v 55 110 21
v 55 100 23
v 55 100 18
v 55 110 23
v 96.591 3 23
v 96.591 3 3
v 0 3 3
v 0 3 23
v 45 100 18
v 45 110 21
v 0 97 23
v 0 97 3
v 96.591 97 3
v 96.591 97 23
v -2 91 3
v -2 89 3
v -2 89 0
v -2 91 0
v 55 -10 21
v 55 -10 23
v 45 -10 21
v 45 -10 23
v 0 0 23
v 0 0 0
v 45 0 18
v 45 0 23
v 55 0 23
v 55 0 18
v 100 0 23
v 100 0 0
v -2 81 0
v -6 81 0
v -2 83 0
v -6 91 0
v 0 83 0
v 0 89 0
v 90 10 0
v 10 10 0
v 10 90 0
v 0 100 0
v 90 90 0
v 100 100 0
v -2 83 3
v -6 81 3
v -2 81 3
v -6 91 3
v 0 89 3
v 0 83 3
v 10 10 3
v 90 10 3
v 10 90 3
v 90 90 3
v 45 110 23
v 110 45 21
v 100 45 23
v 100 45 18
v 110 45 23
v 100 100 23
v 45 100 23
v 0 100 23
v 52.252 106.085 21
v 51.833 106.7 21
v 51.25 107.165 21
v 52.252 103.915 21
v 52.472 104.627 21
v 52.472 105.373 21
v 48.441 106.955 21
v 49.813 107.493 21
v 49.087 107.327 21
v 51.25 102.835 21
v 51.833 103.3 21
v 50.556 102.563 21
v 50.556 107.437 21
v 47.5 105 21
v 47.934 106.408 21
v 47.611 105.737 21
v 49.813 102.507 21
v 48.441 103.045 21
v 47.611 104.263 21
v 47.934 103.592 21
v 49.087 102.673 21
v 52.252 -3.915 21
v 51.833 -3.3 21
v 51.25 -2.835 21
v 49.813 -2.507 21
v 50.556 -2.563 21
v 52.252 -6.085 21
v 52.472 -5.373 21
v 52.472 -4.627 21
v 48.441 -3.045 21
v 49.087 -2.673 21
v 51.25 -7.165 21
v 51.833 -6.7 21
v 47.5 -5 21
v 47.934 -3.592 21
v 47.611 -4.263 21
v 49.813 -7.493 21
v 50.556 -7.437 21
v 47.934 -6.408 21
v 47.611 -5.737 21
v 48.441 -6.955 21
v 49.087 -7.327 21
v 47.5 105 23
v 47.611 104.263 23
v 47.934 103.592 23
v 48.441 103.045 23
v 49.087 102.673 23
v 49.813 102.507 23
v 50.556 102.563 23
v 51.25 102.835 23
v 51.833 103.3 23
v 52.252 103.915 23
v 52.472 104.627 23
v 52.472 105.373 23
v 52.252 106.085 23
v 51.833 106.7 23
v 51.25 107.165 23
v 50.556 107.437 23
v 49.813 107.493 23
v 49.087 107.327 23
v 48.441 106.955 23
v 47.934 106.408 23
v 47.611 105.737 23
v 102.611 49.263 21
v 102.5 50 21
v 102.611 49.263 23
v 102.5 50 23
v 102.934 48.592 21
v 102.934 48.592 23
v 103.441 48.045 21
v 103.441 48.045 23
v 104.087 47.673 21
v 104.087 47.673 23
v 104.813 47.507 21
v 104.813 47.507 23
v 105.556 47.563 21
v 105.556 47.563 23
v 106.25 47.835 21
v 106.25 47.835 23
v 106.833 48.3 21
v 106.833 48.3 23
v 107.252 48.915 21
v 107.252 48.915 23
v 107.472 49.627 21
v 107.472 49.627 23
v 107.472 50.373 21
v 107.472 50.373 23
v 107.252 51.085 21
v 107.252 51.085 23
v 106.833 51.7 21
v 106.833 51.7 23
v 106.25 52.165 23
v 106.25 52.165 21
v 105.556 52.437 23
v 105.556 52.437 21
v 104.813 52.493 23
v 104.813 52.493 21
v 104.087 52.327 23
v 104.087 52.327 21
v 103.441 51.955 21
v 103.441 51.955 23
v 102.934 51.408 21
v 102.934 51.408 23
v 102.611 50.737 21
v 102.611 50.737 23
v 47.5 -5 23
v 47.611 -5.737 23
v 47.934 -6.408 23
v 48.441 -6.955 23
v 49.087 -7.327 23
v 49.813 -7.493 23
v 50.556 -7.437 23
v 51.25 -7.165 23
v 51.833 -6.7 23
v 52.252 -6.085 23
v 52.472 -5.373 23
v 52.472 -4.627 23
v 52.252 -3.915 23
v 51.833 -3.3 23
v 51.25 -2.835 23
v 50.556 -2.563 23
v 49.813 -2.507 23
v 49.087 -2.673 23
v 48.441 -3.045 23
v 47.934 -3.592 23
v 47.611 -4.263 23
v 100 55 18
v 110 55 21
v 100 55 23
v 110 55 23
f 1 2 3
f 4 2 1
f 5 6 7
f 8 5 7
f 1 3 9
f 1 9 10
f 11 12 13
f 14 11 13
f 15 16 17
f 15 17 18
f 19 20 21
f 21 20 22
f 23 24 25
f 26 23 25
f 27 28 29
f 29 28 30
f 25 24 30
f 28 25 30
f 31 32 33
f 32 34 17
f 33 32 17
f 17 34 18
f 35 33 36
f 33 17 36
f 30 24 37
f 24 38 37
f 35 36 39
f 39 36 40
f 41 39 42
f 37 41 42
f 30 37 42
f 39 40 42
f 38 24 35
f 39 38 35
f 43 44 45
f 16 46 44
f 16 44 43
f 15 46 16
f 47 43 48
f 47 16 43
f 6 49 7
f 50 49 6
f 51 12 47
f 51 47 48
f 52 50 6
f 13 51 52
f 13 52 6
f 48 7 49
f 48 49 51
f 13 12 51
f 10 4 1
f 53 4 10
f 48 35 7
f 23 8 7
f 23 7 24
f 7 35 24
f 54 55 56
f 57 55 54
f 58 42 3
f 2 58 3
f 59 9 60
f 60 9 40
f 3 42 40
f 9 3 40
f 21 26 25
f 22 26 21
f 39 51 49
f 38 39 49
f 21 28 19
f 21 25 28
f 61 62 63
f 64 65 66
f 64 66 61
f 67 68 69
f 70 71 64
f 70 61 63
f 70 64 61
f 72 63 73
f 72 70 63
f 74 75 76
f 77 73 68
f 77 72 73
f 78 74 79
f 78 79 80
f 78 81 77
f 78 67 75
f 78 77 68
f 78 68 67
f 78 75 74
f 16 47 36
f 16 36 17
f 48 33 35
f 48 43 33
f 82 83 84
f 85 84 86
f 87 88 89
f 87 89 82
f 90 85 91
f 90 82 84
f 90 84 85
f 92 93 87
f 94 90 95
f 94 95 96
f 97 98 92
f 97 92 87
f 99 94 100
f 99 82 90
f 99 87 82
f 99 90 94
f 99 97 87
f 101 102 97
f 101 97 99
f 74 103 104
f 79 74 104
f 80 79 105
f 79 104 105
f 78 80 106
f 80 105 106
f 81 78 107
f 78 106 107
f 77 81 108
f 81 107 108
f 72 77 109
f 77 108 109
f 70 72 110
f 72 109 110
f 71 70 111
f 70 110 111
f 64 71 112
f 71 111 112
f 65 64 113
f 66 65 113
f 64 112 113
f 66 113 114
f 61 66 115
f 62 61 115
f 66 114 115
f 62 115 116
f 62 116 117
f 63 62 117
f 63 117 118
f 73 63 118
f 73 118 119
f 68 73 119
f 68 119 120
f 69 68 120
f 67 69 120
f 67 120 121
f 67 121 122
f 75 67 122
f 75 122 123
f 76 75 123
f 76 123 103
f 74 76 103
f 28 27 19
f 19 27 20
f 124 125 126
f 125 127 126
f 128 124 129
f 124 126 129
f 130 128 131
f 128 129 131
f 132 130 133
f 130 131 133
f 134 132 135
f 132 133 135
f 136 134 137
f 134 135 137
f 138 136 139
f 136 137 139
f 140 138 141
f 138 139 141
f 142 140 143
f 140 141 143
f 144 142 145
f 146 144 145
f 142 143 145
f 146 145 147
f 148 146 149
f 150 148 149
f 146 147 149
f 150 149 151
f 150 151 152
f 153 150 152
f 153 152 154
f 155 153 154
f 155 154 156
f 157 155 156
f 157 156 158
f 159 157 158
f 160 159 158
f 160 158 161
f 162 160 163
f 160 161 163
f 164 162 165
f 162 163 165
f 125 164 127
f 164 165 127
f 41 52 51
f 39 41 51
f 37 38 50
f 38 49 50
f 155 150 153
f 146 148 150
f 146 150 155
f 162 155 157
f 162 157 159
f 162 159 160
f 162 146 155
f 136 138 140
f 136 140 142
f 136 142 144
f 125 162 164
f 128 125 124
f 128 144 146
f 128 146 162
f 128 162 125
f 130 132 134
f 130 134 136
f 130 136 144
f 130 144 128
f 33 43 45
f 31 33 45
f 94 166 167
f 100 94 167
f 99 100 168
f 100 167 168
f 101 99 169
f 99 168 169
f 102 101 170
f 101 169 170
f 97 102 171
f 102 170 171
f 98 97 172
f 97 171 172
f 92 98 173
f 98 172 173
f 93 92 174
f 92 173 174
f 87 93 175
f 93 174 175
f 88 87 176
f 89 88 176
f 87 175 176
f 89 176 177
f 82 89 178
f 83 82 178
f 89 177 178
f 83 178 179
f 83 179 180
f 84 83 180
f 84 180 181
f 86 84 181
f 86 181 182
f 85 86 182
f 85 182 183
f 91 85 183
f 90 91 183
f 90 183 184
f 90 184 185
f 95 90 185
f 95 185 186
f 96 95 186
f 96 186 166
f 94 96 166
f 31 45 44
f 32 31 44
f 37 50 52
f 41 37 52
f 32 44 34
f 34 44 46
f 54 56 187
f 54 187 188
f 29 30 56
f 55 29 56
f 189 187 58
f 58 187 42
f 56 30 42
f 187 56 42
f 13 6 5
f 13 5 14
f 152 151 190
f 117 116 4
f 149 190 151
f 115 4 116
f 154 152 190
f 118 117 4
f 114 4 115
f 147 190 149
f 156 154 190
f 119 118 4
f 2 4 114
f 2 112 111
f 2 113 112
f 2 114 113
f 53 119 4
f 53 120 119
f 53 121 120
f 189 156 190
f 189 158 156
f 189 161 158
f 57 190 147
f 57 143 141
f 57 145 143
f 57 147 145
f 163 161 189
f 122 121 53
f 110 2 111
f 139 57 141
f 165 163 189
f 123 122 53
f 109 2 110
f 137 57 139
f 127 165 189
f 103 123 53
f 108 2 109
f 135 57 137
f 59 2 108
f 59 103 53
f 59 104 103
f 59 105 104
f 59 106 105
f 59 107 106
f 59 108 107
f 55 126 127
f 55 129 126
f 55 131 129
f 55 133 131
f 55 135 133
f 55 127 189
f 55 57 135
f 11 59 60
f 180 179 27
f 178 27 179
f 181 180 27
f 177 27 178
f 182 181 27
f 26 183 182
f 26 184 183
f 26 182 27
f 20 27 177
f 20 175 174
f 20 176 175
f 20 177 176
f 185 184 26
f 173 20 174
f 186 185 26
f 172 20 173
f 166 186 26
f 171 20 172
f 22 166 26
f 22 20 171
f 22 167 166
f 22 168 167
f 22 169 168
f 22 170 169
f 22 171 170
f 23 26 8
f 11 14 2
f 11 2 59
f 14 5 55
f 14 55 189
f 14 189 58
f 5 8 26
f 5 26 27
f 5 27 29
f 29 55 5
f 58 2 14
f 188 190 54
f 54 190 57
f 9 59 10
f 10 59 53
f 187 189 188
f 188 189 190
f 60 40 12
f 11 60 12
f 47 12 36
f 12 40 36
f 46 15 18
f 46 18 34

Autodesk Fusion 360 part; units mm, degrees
sketch "Szkic1" plane through (0, 0, 0) normal (0, 0, 1) x (1, 0, 0)
  line L0 (0, 0) -> (100, 0)
  line L1 (100, 0) -> (100, 100)
  line L2 (100, 100) -> (0, 100)
  line L3 (0, 100) -> (0, 0)
  dimension "d1" = 100
  dimension "d2" = 100
extrude "Wyciągnięcie proste1" add sketch "Szkic1" along normal blind 3
sketch "Szkic2" plane through (0, 0, 3) normal (0, 0, 1) x (-1, 0, 0)
  line L0 (0, -100) -> (0, 0)
  line L1 (0, 0) -> (-100, 0)
  line L2 (-100, 0) -> (-100, -100)
  line L3 (-100, -100) -> (0, -100)
  line L4 (-10, -10) -> (-90, -10)
  line L5 (-90, -10) -> (-90, -90)
  line L6 (-90, -90) -> (-10, -90)
  line L7 (-10, -90) -> (-10, -10)
extrude "Wyciągnięcie proste2" cut sketch "Szkic2" against normal blind 3 contours L4 L5 L6 L7
sketch "Szkic3" plane through (0, 0, 3) normal (0, 0, 1) x (-1, 0, 0)
  line L0 (-90, -10) -> (-10, -10)
  line L1 (-10, -10) -> (-10, -90)
  line L2 (-10, -90) -> (-90, -90)
  line L3 (-90, -90) -> (-90, -10)
  line L4 (0, -100) -> (0, 0)
  line L5 (0, 0) -> (-100, 0)
  line L6 (-100, 0) -> (-100, -100)
  line L7 (-100, -100) -> (0, -100)
  line L8 (0, 0) -> (-100, 0)
  line L9 (-100, 0) -> (-100, -3)
  line L10 (-100, -3) -> (0, -3)
  line L11 (0, -3) -> (0, 0)
  line L12 (-100, -3) -> (-96.5907, -3)
  line L13 (-96.5907, -3) -> (-96.5907, -100)
  line L14 (-96.5907, -100) -> (-100, -100)
  line L15 (-100, -100) -> (-100, -3)
  line L16 (-96.5907, -100) -> (0, -100)
  line L17 (0, -100) -> (0, -97)
  line L18 (0, -97) -> (-96.5907, -97)
  line L19 (-96.5907, -97) -> (-96.5907, -100)
extrude "Wyciągnięcie proste3" add sketch "Szkic3" along normal blind 20 contours L4 L7 L13 L16 L17 L18 L19 | L6 L7 L10 L12 L13 L14 L15 L19 | L4 L5 L6 L8 L9 L10 L11 L12
sketch "Szkic4" plane through (0, 0, 3) normal (0, 0, 1) x (-1, 0, 0)
  line L0 (0, -3) -> (-96.5907, -3)
  line L1 (-96.5907, -3) -> (-96.5907, -97)
  line L2 (-96.5907, -97) -> (0, -97)
  line L3 (0, -97) -> (0, -3)
  line L4 (-90, -10) -> (-10, -10)
  line L5 (-10, -10) -> (-10, -90)
  line L6 (-10, -90) -> (-90, -90)
  line L7 (-90, -90) -> (-90, -10)
  line L8 (0, -97) -> (0, -89)
  line L9 (0, -89) -> (2, -89)
  line L10 (2, -89) -> (2, -91)
  line L11 (2, -91) -> (6, -91)
  line L12 (0, -89) -> (0, -83)
  line L13 (2, -83) -> (2, -81)
  line L14 (2, -81) -> (6, -81)
  line L15 (6, -81) -> (6, -91)
  line L16 (2, -83) -> (0, -83)
  line L17 (0, -83) -> (0, -89.2495)
extrude "Wyciągnięcie proste4" add sketch "Szkic4" against normal blind 3 contours L3 L9 L10 L11 L12 L13 L14 L15 L16 L17
sketch "Szkic5" plane through (0, 0, 23) normal (0, 0, 1) x (-1, 0, 0)
  line L0 (-100, -100) -> (0, -100)
  line L1 (0, -100) -> (0, -97)
  line L2 (0, -97) -> (-96.5907, -97)
  line L3 (-96.5907, -97) -> (-96.5907, -3)
  line L4 (-96.5907, -3) -> (0, -3)
  line L5 (0, -3) -> (0, 0)
  line L6 (0, 0) -> (-100, 0)
  line L7 (-100, 0) -> (-100, -100)
  line L8 (-45, -100) -> (-55, -100)
  line L9 (-55, -100) -> (-55, -110)
  line L10 (-55, -110) -> (-45, -110)
  line L11 (-45, -110) -> (-45, -100)
  line L12 (-100, -55) -> (-110, -55)
  line L13 (-110, -55) -> (-110, -45)
  line L14 (-110, -45) -> (-100, -45)
  line L15 (-100, -45) -> (-100, -55)
  line L16 (-45, 0) -> (-55, 0)
  line L17 (-55, 0) -> (-55, 10)
  line L18 (-55, 10) -> (-45, 10)
  line L19 (-45, 10) -> (-45, 0)
extrude "Wyciągnięcie proste5" add sketch "Szkic5" against normal blind 2 contours L0 L8 L9 L10 L11 | L7 L12 L13 L14 L15 | L6 L16 L17 L18 L19
sketch "Szkic6" plane through (45, 0, 0) normal (-1, 0, 0) x (0, -1, 0)
  line L0 (10, 23) -> (0, 23)
  line L1 (0, 23) -> (0, 21)
  line L2 (0, 21) -> (10, 21)
  line L3 (10, 21) -> (10, 23)
  line L4 (0, 21) -> (0, 18)
  line L5 (0, 18) -> (10, 21)
  line L6 (0, 21) -> (10, 21)
extrude "Wyciągnięcie proste6" add sketch "Szkic6" against normal blind 10 contours L2 L4 L5 L6
sketch "Szkic7" plane through (0, 45, 0) normal (0, -1, 0) x (1, 0, 0)
  line L0 (110, 23) -> (100, 23)
  line L1 (100, 23) -> (100, 21)
  line L2 (100, 21) -> (110, 21)
  line L3 (110, 21) -> (110, 23)
  line L4 (100, 21) -> (100, 18)
  line L5 (100, 18) -> (110, 21)
  line L6 (100, 21) -> (110, 21)
extrude "Wyciągnięcie proste7" add sketch "Szkic7" against normal blind 10 contours L2 L4 L5 L6
sketch "Szkic8" plane through (55, 0, 0) normal (1, 0, 0) x (0, 1, 0)
  line L0 (110, 23) -> (100, 23)
  line L1 (100, 23) -> (100, 21)
  line L2 (100, 21) -> (110, 21)
  line L3 (110, 21) -> (110, 23)
  line L4 (100, 21) -> (100, 18)
  line L5 (100, 18) -> (110, 21)
  line L6 (100, 21) -> (110, 21)
extrude "Wyciągnięcie proste8" add sketch "Szkic8" against normal blind 10 contours L2 L4 L5 L6
sketch "Szkic9" plane through (0, 0, 23) normal (0, 0, 1) x (-1, 0, 0)
  line L0 (-100, -100) -> (-55, -100)
  line L1 (-55, -100) -> (-55, -110)
  line L2 (-55, -110) -> (-45, -110)
  line L3 (-45, -110) -> (-45, -100)
  line L4 (-45, -100) -> (0, -100)
  line L5 (0, -100) -> (0, -97)
  line L6 (0, -97) -> (-96.5907, -97)
  line L7 (-96.5907, -97) -> (-96.5907, -3)
  line L8 (-96.5907, -3) -> (0, -3)
  line L9 (0, -3) -> (0, 0)
  line L10 (0, 0) -> (-45, 0)
  line L11 (-45, 0) -> (-45, 10)
  line L12 (-45, 10) -> (-55, 10)
  line L13 (-55, 10) -> (-55, 0)
  line L14 (-55, 0) -> (-100, 0)
  line L15 (-100, 0) -> (-100, -45)
  line L16 (-100, -45) -> (-110, -45)
  line L17 (-110, -45) -> (-110, -55)
  line L18 (-110, -55) -> (-100, -55)
  line L19 (-100, -55) -> (-100, -100)
  circle A0 centre (-50, 5) radius 2.5
  circle A1 centre (-105, -50) radius 2.5
  circle A2 centre (-50, -105) radius 2.5
  dimension "d19" = 5
  dimension "d20" = 5
  dimension "d21" = 5
extrude "Wyciągnięcie proste9" cut sketch "Szkic9" against normal blind 2 contours A0 | A1 | A2
